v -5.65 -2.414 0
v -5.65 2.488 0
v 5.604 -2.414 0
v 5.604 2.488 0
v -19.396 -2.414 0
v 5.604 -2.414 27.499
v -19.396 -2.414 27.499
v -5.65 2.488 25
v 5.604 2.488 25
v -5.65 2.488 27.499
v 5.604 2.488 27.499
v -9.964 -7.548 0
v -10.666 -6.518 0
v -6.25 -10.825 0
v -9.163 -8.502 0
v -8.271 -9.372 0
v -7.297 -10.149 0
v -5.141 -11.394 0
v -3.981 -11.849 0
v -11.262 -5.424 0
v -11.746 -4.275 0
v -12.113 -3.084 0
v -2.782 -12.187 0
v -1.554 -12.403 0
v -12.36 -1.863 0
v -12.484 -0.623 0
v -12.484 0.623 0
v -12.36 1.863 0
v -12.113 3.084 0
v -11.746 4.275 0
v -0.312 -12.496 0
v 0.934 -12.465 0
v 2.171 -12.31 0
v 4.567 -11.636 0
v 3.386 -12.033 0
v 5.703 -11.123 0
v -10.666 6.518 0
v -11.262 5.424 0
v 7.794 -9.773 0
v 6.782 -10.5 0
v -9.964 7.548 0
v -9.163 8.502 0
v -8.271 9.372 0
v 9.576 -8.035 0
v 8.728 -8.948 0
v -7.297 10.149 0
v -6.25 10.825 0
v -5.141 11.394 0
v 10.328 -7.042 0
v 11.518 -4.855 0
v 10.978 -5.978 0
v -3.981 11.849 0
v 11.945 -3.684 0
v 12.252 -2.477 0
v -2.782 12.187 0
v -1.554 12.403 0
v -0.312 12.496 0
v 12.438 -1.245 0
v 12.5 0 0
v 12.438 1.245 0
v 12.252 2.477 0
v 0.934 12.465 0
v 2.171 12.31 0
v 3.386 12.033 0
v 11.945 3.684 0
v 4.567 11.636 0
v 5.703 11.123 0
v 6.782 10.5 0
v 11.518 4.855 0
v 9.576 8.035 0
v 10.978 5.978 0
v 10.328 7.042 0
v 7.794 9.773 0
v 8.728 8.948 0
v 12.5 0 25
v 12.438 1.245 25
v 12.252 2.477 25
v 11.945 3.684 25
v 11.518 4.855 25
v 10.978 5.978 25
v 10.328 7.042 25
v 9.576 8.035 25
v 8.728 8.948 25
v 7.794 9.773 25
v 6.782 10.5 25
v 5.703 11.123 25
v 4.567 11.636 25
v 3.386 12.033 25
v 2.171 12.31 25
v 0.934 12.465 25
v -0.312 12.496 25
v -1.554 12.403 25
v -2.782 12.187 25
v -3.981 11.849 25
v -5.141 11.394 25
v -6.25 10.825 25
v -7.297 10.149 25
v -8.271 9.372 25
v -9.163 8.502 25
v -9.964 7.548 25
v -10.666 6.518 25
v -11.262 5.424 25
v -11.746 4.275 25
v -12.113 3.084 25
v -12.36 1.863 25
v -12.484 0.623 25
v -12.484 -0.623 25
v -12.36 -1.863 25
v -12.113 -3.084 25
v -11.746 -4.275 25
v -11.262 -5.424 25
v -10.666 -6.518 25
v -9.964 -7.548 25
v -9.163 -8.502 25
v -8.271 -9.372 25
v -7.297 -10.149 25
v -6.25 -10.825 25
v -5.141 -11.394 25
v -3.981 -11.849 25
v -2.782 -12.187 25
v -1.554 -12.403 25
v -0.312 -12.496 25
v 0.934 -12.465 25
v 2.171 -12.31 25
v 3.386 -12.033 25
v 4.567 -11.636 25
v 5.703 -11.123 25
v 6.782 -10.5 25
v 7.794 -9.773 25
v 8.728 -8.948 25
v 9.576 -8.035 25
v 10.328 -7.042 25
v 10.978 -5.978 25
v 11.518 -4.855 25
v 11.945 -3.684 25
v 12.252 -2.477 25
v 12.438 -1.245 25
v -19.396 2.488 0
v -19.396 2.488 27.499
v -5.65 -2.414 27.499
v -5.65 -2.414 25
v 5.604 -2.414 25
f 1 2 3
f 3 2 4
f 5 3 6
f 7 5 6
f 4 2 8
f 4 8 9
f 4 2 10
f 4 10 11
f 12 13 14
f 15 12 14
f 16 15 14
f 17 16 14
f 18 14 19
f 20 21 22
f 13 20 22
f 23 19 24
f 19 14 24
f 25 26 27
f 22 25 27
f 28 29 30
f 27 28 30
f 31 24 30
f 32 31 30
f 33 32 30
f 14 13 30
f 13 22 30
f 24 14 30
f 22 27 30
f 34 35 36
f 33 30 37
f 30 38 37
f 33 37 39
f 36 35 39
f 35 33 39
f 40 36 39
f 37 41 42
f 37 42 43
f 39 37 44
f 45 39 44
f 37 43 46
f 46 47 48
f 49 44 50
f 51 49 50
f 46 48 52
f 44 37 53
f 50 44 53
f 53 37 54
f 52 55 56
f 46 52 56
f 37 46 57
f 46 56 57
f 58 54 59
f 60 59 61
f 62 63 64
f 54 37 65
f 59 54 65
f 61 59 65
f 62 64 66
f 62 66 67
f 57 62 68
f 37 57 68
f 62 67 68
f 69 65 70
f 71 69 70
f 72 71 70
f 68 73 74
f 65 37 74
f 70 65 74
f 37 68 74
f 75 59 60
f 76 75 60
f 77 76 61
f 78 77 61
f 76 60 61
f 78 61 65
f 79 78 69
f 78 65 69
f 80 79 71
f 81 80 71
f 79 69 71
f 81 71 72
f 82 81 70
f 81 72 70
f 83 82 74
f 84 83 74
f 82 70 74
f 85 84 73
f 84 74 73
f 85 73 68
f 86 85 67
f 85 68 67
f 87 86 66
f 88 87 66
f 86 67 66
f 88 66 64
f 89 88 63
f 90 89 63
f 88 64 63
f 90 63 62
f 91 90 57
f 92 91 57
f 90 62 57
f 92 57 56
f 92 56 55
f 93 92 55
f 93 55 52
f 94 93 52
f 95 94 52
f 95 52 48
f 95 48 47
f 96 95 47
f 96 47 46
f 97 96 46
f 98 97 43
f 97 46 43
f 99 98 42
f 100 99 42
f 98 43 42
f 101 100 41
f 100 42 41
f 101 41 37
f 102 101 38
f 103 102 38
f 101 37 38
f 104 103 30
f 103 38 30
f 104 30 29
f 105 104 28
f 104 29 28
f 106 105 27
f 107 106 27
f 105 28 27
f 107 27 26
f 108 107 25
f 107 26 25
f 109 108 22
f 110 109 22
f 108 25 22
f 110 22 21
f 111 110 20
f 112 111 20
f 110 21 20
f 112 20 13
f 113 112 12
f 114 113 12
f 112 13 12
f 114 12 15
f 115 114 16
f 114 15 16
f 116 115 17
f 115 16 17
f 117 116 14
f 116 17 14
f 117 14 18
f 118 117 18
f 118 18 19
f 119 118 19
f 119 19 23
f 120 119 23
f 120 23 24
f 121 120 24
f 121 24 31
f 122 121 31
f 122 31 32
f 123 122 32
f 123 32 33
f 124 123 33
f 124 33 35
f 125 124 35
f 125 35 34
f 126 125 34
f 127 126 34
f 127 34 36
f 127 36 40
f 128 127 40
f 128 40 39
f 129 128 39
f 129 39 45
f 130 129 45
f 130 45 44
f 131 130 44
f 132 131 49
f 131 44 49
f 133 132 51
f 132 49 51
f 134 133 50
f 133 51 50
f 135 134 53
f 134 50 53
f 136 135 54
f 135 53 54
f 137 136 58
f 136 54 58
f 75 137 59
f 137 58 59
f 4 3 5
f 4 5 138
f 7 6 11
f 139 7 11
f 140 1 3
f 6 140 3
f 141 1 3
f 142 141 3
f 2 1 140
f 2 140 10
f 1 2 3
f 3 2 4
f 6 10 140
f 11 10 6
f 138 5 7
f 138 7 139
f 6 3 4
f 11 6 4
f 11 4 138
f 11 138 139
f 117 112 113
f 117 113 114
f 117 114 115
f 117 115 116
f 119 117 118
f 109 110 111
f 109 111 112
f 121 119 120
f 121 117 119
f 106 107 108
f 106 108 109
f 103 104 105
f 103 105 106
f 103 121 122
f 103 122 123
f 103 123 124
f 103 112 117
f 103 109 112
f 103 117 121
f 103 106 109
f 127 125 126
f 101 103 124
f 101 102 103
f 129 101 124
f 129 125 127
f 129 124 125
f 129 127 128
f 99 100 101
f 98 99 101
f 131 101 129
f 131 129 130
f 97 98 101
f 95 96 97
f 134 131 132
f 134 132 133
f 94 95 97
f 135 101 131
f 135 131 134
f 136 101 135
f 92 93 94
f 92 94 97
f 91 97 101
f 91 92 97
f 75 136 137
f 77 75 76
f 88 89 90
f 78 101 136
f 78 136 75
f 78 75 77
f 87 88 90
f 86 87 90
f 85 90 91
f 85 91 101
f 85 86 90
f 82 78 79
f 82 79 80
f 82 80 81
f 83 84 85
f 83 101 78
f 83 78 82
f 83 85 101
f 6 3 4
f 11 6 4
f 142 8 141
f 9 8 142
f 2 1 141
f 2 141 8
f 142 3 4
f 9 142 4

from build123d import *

# Parameters (mm, degrees)
F0_R     = 12.5
F3_DEPTH = 25
F1_W     = 11.2541733542
F1_H     = 4.901913926
F2_W     = 11.2541733542
F2_H     = 4.901913926
F4_DEPTH = 27.4987090379
F5_DEPTH = 25


with BuildPart() as f3:
    # F0 (on Top) → F3 (new body)
    with BuildSketch(Plane.XY):
        Circle(F0_R)
    extrude(amount=F3_DEPTH)


with BuildPart() as f3b:
    # F1 (on face) → F3, piece 2 (new body)
    with BuildSketch(Plane.XY):
        with Locations((-0.0226280536, 0.0370293856)):
            Rectangle(F1_W, F1_H)
    extrude(amount=F3_DEPTH)


with BuildPart() as f4:
    # F2 (on face) → F4 (new body)
    with BuildSketch(Plane.XY):
        with Locations((-0.0226280536, 0.0370293856)):
            Rectangle(F2_W, F2_H)
    extrude(amount=F4_DEPTH)


with BuildPart() as f5:
    # F5 (new): a face of the model
    f5_faces = [f4.part.faces().sort_by_distance(p)[0] for p in [
        (5.6044586236, 0.0370293856, 13.7493545189),
    ]]
    extrude(f5_faces, amount=-F5_DEPTH)


solid = Compound([f3.part, f3b.part, f4.part, f5.part])
